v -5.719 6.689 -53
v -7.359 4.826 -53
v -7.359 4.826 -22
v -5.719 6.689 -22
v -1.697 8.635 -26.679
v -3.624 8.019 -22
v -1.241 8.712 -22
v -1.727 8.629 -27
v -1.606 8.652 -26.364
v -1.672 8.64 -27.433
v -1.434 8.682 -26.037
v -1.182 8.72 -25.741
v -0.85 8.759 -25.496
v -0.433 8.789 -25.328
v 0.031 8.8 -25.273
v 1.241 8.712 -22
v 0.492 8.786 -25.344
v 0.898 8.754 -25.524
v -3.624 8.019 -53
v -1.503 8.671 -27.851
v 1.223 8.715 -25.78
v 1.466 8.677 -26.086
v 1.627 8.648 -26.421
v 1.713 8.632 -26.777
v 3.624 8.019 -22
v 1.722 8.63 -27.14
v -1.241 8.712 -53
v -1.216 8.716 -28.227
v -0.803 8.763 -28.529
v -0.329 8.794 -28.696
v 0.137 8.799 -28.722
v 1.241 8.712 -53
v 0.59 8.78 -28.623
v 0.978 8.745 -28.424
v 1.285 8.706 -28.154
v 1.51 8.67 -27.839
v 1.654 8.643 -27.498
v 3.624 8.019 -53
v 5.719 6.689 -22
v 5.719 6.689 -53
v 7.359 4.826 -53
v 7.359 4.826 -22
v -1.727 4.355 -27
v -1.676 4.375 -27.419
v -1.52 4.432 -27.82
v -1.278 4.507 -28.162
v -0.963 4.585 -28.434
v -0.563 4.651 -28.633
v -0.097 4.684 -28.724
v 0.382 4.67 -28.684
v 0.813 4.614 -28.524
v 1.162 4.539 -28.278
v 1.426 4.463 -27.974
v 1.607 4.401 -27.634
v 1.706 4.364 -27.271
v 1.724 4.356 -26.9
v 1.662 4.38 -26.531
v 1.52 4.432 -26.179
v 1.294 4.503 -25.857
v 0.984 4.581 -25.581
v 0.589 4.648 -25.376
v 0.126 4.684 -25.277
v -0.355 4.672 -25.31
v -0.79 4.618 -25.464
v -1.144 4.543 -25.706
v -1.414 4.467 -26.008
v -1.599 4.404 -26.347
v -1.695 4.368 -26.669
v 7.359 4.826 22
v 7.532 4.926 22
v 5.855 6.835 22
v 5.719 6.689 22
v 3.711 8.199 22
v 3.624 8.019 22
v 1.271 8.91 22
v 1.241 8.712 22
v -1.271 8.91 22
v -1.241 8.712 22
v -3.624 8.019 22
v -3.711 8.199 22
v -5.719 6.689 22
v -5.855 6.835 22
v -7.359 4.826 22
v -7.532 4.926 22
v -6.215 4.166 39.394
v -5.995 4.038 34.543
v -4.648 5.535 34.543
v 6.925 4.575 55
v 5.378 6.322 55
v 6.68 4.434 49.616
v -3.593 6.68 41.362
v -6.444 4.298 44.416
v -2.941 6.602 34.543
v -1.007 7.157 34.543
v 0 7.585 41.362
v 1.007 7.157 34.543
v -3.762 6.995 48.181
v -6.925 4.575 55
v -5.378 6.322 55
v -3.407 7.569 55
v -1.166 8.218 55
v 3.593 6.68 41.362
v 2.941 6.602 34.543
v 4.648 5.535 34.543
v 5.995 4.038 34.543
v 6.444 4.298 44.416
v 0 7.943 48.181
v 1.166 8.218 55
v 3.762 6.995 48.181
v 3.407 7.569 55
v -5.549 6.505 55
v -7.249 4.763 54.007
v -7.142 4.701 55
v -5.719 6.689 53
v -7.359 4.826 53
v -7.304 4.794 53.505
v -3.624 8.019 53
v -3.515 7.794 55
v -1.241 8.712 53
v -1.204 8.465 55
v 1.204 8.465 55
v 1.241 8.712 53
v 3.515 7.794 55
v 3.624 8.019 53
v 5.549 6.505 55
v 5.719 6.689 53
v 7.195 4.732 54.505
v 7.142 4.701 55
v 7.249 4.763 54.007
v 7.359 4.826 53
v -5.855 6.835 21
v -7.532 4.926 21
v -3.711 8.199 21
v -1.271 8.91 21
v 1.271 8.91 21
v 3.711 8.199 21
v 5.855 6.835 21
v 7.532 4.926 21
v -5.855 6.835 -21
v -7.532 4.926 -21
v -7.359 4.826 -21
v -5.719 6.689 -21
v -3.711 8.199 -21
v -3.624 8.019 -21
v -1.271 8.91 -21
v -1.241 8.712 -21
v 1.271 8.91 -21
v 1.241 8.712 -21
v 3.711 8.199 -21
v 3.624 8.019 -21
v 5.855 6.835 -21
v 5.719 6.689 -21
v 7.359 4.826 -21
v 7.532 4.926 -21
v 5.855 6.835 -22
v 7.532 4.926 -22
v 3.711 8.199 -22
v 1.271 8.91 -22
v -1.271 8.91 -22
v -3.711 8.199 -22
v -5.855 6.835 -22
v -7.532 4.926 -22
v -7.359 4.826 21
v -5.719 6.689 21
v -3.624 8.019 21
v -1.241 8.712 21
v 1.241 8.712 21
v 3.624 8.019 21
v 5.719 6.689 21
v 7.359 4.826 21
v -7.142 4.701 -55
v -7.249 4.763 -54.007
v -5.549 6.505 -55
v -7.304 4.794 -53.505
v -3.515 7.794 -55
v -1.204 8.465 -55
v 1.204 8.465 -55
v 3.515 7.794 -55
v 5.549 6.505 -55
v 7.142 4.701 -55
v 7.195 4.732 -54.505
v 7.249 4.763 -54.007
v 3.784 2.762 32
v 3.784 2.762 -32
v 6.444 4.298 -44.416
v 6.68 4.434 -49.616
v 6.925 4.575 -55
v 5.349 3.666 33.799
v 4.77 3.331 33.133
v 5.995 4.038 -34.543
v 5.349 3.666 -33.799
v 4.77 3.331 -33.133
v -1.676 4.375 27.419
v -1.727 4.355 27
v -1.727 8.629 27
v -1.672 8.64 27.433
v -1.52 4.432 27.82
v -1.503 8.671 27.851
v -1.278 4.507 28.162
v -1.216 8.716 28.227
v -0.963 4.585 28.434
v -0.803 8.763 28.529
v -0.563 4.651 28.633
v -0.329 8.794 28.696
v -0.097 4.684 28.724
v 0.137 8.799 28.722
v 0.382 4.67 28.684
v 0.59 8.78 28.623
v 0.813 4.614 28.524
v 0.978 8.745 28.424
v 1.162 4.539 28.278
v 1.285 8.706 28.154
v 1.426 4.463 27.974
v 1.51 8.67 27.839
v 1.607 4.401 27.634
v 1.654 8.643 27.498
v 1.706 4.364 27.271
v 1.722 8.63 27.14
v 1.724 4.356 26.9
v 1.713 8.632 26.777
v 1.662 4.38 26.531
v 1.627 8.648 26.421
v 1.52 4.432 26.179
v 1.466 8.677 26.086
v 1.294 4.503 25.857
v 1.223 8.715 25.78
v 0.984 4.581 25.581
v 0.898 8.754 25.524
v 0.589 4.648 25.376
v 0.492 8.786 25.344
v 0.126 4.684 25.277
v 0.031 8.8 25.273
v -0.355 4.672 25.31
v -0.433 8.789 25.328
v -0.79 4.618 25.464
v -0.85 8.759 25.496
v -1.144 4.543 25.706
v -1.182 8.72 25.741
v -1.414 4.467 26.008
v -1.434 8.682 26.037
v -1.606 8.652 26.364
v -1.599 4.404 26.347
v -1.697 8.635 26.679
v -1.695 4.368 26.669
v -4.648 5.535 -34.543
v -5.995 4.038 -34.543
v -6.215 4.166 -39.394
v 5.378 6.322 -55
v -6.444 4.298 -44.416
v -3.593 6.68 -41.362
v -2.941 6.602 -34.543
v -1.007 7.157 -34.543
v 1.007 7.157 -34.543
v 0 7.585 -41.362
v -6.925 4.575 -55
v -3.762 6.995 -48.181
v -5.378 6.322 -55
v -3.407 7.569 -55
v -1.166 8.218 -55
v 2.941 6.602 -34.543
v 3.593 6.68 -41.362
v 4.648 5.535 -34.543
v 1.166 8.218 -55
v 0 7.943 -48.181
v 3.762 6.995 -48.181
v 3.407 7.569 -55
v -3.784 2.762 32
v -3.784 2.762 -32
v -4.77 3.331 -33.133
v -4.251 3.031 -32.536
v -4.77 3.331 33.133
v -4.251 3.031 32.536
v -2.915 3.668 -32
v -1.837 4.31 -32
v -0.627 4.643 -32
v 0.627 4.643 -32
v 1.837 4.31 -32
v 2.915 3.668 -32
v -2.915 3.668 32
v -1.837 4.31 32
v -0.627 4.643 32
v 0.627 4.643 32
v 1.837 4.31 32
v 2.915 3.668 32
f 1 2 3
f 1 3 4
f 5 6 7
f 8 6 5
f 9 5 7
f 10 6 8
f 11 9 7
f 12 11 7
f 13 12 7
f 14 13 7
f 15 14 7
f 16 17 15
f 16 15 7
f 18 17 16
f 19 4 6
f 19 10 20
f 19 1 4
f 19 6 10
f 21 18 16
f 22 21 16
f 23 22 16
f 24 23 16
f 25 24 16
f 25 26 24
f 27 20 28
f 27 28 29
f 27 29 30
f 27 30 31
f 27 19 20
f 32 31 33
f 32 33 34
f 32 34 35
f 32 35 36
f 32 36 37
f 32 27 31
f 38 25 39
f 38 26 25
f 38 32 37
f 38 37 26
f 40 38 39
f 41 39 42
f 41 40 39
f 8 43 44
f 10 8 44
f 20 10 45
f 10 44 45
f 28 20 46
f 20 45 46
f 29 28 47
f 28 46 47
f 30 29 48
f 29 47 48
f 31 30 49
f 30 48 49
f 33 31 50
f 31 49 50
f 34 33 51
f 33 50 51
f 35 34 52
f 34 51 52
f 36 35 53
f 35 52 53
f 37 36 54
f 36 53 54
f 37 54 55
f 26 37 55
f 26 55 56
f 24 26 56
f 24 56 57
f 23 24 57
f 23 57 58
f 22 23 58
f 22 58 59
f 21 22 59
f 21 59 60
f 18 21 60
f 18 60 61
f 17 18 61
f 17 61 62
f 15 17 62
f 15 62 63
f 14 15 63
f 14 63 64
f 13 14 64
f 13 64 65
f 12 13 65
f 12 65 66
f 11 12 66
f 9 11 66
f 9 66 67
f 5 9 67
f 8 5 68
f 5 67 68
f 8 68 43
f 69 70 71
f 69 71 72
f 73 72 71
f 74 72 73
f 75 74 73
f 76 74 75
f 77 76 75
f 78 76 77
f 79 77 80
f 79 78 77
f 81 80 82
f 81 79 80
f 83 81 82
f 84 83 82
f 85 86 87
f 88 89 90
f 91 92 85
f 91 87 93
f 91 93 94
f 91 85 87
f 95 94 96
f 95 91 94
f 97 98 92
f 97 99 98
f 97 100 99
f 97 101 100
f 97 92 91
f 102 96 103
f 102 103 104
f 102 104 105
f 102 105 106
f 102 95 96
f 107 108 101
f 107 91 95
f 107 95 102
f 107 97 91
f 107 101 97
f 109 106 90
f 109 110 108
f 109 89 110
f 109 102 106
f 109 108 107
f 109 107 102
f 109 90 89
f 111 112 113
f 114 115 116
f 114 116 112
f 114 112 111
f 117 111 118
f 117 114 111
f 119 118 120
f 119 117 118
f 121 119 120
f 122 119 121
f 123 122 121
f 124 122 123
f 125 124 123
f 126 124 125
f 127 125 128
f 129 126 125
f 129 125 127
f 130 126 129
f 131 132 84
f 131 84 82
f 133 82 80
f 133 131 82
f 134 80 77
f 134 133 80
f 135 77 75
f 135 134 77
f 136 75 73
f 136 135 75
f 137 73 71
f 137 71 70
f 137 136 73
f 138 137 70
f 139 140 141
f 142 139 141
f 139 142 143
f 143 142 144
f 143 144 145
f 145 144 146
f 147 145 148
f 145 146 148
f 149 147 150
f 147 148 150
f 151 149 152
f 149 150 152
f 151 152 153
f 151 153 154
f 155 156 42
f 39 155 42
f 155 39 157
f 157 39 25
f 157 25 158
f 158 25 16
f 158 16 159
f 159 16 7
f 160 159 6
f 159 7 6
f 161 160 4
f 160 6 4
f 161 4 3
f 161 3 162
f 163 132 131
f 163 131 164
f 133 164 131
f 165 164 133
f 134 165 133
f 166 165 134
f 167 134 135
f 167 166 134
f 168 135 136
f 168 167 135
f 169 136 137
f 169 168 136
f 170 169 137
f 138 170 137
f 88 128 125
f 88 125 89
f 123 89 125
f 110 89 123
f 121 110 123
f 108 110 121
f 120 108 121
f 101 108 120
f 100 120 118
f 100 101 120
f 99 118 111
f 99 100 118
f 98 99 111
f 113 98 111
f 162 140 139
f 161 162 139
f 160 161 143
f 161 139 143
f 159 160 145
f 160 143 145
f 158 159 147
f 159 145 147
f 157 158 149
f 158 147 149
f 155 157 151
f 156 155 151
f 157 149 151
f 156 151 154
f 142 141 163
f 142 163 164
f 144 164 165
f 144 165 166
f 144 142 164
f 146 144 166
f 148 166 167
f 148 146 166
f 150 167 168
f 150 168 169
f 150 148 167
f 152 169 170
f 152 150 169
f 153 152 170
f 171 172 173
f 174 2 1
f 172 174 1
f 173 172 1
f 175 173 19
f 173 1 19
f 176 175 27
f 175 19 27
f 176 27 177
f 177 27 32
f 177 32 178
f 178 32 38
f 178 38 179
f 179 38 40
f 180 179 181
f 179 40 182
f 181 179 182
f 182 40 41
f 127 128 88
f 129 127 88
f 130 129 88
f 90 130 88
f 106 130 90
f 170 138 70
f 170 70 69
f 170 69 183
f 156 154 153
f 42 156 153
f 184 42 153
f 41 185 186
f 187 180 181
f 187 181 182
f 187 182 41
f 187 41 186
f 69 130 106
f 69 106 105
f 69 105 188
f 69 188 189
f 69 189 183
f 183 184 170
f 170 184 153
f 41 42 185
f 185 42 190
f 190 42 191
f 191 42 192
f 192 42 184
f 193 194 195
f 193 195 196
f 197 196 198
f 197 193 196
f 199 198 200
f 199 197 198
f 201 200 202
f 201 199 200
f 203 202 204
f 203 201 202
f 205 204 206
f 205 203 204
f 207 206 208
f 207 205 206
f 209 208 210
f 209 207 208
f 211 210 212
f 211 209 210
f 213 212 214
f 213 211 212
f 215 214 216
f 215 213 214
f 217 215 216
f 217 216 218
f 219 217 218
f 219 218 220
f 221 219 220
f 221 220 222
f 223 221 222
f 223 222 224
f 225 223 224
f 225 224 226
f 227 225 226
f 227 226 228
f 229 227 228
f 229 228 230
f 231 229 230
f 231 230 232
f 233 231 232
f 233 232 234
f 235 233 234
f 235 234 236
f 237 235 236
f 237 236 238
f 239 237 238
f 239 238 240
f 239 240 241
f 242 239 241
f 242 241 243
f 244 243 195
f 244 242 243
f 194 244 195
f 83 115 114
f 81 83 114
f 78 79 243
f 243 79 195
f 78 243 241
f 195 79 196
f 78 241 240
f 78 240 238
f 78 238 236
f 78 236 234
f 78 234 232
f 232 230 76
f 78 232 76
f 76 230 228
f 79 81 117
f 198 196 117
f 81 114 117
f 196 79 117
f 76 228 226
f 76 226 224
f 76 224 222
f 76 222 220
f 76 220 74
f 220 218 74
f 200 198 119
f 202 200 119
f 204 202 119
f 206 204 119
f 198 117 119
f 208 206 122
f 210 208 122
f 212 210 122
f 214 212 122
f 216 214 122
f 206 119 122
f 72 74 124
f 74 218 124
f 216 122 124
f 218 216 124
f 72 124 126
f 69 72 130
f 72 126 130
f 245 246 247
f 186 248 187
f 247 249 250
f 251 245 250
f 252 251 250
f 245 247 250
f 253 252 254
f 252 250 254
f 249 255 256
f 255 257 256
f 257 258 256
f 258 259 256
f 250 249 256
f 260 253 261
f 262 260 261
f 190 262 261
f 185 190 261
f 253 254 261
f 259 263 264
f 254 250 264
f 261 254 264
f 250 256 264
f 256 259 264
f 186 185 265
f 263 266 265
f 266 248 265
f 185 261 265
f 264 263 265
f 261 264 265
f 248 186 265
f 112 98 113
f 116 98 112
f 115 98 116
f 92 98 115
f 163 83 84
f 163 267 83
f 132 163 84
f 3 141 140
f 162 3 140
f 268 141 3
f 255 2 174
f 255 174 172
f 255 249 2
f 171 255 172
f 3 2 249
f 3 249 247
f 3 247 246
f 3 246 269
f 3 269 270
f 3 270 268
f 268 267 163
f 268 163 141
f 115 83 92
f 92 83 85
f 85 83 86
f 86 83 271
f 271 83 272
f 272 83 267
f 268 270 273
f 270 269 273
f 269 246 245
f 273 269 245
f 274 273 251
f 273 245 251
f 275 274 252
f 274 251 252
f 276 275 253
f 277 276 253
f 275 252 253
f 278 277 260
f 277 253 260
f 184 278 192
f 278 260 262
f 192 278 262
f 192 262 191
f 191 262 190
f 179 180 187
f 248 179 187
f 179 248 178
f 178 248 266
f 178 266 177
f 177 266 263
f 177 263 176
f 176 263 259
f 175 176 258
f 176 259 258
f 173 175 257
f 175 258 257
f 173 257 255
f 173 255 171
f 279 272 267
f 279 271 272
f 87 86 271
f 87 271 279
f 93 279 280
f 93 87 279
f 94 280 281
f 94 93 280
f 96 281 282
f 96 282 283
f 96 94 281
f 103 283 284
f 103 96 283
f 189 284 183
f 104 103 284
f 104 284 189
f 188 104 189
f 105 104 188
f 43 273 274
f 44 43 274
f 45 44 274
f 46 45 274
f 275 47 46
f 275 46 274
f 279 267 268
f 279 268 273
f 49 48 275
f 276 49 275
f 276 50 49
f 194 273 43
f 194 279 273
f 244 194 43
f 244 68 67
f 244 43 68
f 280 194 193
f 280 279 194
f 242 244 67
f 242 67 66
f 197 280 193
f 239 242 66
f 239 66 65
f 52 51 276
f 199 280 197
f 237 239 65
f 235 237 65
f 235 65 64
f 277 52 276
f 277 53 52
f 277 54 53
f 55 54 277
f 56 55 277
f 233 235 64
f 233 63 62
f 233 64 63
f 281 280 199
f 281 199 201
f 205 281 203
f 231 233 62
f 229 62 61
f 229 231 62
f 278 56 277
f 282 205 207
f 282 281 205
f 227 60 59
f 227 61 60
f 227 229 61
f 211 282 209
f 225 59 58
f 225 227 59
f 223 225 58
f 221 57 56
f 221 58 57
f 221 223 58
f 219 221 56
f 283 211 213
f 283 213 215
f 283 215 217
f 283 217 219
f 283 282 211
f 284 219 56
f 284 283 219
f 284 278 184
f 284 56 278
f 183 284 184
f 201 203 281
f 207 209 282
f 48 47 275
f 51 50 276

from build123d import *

# Parameters (mm, degrees)
F_8_32_TAPPED_HOLE1_D     = 3.4544
F_8_32_TAPPED_HOLE1_DEPTH = 10
F_8_32_TAPPED_HOLE1_TIP   = 1.037806461
CUT_EXTRUDE1_DEPTH        = 56


with BuildPart() as part:
    # Sketch1 → Revolve1 (revolve)
    with BuildSketch(Plane(origin=(0, 0, 0), x_dir=(1, 0, 0), z_dir=(0, 1, 0))):
        Polygon((4.6852, 0), (4.6852, 32), (7.227877139, 34.542677139), (8.3, 55), (8.55, 55), (8.8, 53), (8.8, 32), (8.8, 22), (9, 22), (9, 21), (8.8, 21), (8.8, 0), align=None)
    revolve(axis=Axis((0, 0, 0), (0, 0, -1)))

    # 8-32 Tapped Hole1
    with Locations(Plane(origin=(0, 8.8, -27), x_dir=(1, 0, 0), z_dir=(0, 1, 0))):
        with Locations((0, 0)):
            Hole(F_8_32_TAPPED_HOLE1_D / 2, depth=F_8_32_TAPPED_HOLE1_DEPTH)
            with Locations((0, 0, -(F_8_32_TAPPED_HOLE1_DEPTH + F_8_32_TAPPED_HOLE1_TIP / 2))):  # 118° drill point
                Cone(0, F_8_32_TAPPED_HOLE1_D / 2, F_8_32_TAPPED_HOLE1_TIP, mode=Mode.SUBTRACT)

    # Sketch3 → Cut-Extrude1 (cut, through all)
    with BuildSketch(Plane.XY):
        with BuildLine():
            Line((7.532191208, 4.926062891), (0, 0.577350269))
            Line((0, 0.577350269), (-7.532191208, 4.926062891))
            ThreePointArc((-7.532191208, 4.926062891), (0, -9), (7.532191208, 4.926062891))
        make_face()
    extrude(amount=-CUT_EXTRUDE1_DEPTH, mode=Mode.SUBTRACT)

    # Mirror1: part across plane


with BuildPart() as part_1:
    add(part.part)
    add(part.part.mirror(Plane(origin=(8.8, 0, 0), x_dir=(1, 0, 0), z_dir=(0, 0, 1))))


solid = part_1.part
